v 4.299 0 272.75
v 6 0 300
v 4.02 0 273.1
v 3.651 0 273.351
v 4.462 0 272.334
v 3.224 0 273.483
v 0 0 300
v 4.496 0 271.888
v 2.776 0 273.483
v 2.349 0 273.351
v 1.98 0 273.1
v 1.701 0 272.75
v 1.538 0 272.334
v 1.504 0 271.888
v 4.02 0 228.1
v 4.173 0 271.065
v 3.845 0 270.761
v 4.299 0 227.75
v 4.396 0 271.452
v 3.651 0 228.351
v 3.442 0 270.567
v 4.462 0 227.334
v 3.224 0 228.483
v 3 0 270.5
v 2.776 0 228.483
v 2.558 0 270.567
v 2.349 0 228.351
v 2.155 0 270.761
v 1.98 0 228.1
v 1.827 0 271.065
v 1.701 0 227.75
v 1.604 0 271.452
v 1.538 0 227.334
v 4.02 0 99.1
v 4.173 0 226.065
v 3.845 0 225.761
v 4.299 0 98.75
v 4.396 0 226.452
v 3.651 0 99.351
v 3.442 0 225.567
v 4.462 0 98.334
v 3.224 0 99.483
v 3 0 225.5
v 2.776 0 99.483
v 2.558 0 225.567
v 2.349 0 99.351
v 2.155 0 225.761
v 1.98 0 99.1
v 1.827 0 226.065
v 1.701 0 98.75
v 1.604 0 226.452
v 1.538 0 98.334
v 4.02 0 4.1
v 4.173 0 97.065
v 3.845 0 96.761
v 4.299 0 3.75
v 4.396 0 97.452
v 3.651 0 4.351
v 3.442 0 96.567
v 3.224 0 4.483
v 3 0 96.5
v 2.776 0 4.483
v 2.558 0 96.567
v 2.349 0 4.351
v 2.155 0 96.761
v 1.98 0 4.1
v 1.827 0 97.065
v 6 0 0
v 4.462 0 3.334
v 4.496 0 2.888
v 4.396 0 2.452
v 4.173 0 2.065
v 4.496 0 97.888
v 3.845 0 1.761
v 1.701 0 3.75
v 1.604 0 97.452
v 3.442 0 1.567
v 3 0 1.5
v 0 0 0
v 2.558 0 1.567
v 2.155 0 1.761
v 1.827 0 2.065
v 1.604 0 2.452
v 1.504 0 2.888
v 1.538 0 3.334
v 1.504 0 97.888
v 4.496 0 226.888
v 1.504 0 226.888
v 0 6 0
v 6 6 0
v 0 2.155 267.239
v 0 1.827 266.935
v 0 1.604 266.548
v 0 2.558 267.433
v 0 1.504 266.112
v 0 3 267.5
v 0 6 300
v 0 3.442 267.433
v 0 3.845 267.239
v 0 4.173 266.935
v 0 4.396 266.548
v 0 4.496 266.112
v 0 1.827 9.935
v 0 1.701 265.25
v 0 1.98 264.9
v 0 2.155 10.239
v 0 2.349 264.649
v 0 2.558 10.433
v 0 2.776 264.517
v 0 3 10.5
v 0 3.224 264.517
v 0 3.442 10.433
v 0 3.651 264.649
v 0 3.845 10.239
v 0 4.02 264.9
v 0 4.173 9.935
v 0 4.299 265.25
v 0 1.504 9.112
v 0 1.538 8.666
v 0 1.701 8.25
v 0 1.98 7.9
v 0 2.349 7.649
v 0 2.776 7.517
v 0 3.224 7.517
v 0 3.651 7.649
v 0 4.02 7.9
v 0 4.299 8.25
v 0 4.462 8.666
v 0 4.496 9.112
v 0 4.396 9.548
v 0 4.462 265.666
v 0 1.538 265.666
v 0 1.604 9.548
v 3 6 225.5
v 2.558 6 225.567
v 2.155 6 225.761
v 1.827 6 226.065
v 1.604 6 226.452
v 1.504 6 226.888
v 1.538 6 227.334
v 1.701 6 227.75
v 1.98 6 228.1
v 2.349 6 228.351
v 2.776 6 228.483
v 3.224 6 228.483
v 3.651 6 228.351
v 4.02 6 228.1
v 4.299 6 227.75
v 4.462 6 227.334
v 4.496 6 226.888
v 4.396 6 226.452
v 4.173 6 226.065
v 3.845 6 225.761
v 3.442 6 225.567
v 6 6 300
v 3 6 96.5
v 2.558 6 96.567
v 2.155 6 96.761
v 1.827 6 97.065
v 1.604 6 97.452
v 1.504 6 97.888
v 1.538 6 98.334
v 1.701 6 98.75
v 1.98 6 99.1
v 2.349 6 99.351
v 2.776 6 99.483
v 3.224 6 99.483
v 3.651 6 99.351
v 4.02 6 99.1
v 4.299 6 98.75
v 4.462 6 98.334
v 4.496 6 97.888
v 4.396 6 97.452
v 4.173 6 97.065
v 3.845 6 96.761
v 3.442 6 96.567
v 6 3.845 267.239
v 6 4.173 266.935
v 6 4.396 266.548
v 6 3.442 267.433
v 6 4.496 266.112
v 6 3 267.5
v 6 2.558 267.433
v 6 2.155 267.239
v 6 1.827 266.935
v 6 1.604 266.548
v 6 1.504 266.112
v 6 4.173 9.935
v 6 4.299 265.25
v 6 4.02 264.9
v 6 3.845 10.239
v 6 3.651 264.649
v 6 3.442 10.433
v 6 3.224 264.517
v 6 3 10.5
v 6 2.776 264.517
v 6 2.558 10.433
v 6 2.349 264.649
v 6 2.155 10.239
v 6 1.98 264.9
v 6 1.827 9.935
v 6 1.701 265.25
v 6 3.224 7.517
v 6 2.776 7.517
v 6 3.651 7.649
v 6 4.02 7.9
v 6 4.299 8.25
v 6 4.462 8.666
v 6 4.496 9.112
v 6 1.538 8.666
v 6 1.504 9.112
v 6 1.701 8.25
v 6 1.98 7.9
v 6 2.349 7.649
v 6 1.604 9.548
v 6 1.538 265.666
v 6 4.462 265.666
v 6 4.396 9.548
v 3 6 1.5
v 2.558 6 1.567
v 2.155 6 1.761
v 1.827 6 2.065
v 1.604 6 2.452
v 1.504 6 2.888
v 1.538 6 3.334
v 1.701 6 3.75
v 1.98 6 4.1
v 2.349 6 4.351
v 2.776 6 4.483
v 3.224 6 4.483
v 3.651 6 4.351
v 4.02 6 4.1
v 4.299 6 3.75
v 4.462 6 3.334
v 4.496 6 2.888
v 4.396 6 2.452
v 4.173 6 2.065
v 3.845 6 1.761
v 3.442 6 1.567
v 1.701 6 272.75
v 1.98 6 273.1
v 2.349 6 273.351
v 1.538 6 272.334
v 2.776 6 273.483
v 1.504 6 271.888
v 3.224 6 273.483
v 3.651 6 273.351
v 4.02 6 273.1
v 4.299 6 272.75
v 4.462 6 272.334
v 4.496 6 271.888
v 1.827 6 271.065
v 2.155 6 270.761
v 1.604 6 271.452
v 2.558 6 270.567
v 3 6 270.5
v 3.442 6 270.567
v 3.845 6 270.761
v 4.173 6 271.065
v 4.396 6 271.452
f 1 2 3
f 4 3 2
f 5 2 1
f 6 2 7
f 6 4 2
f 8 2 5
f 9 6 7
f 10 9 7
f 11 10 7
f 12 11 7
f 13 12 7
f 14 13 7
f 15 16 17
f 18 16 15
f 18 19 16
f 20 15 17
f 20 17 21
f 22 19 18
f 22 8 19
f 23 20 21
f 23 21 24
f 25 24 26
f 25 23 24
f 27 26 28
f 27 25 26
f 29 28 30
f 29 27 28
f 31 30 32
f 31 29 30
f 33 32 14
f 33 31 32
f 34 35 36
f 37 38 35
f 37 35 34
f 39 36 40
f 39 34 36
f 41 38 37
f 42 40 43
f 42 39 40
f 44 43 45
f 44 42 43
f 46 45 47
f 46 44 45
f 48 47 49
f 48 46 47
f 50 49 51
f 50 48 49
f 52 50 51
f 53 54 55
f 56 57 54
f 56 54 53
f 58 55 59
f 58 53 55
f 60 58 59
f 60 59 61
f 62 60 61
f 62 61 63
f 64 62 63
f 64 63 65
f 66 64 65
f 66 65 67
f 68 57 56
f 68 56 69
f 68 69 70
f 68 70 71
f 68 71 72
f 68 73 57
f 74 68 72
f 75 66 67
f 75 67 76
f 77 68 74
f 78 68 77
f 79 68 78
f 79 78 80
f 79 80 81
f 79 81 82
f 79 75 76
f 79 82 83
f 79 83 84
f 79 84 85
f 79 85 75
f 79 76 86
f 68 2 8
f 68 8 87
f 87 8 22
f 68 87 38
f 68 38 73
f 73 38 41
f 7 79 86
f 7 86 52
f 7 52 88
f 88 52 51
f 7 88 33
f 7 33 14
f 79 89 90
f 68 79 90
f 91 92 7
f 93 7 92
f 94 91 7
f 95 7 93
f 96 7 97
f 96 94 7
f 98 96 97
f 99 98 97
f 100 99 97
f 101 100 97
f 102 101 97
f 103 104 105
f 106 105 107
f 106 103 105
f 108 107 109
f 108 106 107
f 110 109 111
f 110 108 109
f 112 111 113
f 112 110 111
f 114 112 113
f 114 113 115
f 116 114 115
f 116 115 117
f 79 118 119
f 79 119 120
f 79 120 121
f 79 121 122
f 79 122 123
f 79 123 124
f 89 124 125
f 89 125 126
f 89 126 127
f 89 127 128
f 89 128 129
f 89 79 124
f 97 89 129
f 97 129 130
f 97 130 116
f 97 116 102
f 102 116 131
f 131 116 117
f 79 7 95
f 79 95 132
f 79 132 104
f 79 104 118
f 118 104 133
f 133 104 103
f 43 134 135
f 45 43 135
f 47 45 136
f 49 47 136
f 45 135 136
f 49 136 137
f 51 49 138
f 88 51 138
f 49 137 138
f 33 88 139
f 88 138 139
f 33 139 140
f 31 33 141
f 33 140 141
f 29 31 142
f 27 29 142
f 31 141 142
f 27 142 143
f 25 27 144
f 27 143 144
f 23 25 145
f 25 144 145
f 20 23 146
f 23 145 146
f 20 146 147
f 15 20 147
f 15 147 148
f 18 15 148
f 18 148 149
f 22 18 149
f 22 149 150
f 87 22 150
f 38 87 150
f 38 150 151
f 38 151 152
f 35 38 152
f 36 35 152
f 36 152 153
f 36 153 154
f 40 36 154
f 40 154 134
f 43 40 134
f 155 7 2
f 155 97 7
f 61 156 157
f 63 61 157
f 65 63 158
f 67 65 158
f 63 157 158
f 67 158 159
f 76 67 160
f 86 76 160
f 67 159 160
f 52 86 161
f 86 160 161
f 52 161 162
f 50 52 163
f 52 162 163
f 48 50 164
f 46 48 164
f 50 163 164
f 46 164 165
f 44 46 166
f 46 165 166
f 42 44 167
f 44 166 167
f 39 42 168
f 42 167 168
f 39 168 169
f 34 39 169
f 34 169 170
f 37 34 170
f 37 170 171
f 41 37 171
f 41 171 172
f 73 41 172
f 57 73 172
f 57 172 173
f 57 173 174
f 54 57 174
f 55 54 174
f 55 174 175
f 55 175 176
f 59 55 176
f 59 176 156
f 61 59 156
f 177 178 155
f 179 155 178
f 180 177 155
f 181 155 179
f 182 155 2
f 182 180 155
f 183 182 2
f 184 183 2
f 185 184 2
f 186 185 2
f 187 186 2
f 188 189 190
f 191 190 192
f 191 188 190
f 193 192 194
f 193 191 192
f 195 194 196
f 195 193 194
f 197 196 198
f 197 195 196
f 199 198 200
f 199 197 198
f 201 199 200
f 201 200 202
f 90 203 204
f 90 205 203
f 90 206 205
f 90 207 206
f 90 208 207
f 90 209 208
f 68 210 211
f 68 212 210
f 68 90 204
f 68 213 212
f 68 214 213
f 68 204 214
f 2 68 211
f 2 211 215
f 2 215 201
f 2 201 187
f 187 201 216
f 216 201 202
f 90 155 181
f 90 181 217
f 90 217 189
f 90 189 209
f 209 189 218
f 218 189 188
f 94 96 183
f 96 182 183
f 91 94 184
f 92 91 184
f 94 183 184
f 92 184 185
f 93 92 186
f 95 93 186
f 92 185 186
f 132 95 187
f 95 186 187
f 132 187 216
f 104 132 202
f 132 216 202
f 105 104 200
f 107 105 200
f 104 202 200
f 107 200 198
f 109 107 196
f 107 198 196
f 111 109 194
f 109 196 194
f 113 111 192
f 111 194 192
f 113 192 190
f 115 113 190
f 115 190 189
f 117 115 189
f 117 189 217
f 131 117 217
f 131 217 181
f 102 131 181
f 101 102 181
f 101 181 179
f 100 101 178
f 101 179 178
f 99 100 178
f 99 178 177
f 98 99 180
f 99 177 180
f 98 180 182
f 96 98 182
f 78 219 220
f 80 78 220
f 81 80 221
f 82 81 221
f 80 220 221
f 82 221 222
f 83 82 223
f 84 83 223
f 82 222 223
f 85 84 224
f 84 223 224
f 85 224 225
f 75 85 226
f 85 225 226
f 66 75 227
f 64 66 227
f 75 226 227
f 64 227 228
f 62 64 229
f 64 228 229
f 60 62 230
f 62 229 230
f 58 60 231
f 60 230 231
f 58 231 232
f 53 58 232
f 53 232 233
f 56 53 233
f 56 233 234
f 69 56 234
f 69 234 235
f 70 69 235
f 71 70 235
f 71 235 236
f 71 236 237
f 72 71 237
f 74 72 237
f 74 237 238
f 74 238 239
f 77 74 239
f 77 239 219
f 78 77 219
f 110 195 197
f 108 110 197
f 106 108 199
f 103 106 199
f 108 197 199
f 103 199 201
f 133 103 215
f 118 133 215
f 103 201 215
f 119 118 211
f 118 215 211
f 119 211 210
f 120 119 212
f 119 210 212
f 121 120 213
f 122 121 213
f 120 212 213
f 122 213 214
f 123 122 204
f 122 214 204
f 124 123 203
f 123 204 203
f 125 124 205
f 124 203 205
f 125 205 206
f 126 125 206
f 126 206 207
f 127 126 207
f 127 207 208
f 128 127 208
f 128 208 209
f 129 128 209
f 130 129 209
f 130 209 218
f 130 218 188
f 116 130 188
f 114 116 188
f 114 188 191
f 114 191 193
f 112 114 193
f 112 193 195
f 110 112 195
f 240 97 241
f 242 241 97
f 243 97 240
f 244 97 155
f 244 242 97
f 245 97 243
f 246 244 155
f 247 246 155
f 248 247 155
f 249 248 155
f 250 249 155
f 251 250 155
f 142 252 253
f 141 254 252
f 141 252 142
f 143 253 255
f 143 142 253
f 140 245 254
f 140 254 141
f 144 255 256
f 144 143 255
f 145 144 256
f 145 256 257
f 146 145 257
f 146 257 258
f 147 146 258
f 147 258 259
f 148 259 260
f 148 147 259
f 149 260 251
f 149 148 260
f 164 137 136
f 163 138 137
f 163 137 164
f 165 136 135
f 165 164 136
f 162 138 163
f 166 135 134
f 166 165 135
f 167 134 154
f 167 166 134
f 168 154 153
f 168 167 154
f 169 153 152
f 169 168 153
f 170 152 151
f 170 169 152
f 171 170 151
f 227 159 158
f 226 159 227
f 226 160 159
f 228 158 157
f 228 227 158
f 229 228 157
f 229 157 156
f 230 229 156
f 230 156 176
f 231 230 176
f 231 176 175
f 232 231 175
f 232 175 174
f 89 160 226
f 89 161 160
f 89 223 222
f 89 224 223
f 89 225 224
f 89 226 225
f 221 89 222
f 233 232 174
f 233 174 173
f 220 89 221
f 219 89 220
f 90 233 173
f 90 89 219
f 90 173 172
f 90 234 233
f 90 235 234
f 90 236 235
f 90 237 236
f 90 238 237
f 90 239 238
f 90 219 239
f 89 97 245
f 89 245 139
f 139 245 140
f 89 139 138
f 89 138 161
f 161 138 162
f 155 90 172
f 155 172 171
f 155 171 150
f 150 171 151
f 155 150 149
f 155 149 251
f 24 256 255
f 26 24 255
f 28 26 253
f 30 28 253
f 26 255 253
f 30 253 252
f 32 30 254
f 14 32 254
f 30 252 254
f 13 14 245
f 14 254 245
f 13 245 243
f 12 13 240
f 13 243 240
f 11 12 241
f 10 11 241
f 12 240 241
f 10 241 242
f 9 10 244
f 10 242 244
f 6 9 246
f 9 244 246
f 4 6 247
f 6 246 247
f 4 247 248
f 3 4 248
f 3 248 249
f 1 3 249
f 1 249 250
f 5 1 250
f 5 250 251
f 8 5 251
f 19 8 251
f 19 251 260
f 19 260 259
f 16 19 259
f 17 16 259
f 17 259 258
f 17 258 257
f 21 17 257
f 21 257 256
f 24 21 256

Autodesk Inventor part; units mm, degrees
ref_plane "YZ Plane" through (0, 0, 0) normal (1, 0, 0) x (0, 1, 0)
ref_plane "XZ Plane" through (0, 0, 0) normal (0, 1, 0) x (-1, 0, 0)
ref_plane "XY Plane" through (0, 0, 0) normal (0, 0, 1) x (1, 0, 0)
sketch "Sketch1" plane through (0, 0, 0) normal (0, 0, 1) x (1, 0, 0)
  line L0 (0, 6) -> (6, 6)
  line L1 (6, 6) -> (6, 0)
  line L2 (6, 0) -> (0, 0)
  line L3 (0, 0) -> (0, 6)
  dimension "d0" = 6
  dimension "d1" = 6
extrude "Extrusion1" add sketch "Sketch1" along normal blind 300
sketch "Sketch3" plane through (0, 0, 0) normal (0, 1, 0) x (-1, 0, 0)
  line L0 (-6, 300) -> (0, 300) construction
  line L1 (-6, 0) -> (-6, 300) construction
  line L2 (0, 0) -> (0, 300) construction
  line L3 (0, 0) -> (-6, 0) construction
  line L4 (-3, 0) -> (-3, 300) construction
  line L5 (0, 300) -> (-6, 300) projected
  line L6 (-6, 0) -> (0, 0) projected
  point P0 (-3, 227)
  point P1 (-3, 98)
  point P2 (-3, 272)
  point P3 (-3, 3)
  dimension "d8" = 129
  dimension "d17" = 73
  dimension "d18" = 28
  dimension "d19" = 3
hole "Hole1" at (3, 0, 227) at (3, 0, 98) at (3, 0, 3) at (3, 0, 272) direction (0, 1, 0) diameter 3 end through all
sketch "Sketch4" plane through (0, 0, 0) normal (-1, 0, 0) x (0, 0, 1)
  line L0 (0, 0) -> (0, 6) construction
  line L1 (0, 0) -> (300, 0) construction
  line L2 (300, 6) -> (300, 0) construction
  line L3 (0, 6) -> (300, 6) construction
  line L4 (0, 0) -> (0, 6) construction
  line L5 (0, 3) -> (300, 3) construction
  line L6 (300, 6) -> (300, 0) construction
  point P0 (266, 3)
  point P1 (9, 3)
  dimension "d20" = 9
  dimension "d21" = 34
hole "Hole2" at (0, 3, 266) at (0, 3, 9) direction (1, 0, 0) diameter 3 end through all
equation "\"d1\" = d0"
properties part number "longitudinal" material "Aluminum"
